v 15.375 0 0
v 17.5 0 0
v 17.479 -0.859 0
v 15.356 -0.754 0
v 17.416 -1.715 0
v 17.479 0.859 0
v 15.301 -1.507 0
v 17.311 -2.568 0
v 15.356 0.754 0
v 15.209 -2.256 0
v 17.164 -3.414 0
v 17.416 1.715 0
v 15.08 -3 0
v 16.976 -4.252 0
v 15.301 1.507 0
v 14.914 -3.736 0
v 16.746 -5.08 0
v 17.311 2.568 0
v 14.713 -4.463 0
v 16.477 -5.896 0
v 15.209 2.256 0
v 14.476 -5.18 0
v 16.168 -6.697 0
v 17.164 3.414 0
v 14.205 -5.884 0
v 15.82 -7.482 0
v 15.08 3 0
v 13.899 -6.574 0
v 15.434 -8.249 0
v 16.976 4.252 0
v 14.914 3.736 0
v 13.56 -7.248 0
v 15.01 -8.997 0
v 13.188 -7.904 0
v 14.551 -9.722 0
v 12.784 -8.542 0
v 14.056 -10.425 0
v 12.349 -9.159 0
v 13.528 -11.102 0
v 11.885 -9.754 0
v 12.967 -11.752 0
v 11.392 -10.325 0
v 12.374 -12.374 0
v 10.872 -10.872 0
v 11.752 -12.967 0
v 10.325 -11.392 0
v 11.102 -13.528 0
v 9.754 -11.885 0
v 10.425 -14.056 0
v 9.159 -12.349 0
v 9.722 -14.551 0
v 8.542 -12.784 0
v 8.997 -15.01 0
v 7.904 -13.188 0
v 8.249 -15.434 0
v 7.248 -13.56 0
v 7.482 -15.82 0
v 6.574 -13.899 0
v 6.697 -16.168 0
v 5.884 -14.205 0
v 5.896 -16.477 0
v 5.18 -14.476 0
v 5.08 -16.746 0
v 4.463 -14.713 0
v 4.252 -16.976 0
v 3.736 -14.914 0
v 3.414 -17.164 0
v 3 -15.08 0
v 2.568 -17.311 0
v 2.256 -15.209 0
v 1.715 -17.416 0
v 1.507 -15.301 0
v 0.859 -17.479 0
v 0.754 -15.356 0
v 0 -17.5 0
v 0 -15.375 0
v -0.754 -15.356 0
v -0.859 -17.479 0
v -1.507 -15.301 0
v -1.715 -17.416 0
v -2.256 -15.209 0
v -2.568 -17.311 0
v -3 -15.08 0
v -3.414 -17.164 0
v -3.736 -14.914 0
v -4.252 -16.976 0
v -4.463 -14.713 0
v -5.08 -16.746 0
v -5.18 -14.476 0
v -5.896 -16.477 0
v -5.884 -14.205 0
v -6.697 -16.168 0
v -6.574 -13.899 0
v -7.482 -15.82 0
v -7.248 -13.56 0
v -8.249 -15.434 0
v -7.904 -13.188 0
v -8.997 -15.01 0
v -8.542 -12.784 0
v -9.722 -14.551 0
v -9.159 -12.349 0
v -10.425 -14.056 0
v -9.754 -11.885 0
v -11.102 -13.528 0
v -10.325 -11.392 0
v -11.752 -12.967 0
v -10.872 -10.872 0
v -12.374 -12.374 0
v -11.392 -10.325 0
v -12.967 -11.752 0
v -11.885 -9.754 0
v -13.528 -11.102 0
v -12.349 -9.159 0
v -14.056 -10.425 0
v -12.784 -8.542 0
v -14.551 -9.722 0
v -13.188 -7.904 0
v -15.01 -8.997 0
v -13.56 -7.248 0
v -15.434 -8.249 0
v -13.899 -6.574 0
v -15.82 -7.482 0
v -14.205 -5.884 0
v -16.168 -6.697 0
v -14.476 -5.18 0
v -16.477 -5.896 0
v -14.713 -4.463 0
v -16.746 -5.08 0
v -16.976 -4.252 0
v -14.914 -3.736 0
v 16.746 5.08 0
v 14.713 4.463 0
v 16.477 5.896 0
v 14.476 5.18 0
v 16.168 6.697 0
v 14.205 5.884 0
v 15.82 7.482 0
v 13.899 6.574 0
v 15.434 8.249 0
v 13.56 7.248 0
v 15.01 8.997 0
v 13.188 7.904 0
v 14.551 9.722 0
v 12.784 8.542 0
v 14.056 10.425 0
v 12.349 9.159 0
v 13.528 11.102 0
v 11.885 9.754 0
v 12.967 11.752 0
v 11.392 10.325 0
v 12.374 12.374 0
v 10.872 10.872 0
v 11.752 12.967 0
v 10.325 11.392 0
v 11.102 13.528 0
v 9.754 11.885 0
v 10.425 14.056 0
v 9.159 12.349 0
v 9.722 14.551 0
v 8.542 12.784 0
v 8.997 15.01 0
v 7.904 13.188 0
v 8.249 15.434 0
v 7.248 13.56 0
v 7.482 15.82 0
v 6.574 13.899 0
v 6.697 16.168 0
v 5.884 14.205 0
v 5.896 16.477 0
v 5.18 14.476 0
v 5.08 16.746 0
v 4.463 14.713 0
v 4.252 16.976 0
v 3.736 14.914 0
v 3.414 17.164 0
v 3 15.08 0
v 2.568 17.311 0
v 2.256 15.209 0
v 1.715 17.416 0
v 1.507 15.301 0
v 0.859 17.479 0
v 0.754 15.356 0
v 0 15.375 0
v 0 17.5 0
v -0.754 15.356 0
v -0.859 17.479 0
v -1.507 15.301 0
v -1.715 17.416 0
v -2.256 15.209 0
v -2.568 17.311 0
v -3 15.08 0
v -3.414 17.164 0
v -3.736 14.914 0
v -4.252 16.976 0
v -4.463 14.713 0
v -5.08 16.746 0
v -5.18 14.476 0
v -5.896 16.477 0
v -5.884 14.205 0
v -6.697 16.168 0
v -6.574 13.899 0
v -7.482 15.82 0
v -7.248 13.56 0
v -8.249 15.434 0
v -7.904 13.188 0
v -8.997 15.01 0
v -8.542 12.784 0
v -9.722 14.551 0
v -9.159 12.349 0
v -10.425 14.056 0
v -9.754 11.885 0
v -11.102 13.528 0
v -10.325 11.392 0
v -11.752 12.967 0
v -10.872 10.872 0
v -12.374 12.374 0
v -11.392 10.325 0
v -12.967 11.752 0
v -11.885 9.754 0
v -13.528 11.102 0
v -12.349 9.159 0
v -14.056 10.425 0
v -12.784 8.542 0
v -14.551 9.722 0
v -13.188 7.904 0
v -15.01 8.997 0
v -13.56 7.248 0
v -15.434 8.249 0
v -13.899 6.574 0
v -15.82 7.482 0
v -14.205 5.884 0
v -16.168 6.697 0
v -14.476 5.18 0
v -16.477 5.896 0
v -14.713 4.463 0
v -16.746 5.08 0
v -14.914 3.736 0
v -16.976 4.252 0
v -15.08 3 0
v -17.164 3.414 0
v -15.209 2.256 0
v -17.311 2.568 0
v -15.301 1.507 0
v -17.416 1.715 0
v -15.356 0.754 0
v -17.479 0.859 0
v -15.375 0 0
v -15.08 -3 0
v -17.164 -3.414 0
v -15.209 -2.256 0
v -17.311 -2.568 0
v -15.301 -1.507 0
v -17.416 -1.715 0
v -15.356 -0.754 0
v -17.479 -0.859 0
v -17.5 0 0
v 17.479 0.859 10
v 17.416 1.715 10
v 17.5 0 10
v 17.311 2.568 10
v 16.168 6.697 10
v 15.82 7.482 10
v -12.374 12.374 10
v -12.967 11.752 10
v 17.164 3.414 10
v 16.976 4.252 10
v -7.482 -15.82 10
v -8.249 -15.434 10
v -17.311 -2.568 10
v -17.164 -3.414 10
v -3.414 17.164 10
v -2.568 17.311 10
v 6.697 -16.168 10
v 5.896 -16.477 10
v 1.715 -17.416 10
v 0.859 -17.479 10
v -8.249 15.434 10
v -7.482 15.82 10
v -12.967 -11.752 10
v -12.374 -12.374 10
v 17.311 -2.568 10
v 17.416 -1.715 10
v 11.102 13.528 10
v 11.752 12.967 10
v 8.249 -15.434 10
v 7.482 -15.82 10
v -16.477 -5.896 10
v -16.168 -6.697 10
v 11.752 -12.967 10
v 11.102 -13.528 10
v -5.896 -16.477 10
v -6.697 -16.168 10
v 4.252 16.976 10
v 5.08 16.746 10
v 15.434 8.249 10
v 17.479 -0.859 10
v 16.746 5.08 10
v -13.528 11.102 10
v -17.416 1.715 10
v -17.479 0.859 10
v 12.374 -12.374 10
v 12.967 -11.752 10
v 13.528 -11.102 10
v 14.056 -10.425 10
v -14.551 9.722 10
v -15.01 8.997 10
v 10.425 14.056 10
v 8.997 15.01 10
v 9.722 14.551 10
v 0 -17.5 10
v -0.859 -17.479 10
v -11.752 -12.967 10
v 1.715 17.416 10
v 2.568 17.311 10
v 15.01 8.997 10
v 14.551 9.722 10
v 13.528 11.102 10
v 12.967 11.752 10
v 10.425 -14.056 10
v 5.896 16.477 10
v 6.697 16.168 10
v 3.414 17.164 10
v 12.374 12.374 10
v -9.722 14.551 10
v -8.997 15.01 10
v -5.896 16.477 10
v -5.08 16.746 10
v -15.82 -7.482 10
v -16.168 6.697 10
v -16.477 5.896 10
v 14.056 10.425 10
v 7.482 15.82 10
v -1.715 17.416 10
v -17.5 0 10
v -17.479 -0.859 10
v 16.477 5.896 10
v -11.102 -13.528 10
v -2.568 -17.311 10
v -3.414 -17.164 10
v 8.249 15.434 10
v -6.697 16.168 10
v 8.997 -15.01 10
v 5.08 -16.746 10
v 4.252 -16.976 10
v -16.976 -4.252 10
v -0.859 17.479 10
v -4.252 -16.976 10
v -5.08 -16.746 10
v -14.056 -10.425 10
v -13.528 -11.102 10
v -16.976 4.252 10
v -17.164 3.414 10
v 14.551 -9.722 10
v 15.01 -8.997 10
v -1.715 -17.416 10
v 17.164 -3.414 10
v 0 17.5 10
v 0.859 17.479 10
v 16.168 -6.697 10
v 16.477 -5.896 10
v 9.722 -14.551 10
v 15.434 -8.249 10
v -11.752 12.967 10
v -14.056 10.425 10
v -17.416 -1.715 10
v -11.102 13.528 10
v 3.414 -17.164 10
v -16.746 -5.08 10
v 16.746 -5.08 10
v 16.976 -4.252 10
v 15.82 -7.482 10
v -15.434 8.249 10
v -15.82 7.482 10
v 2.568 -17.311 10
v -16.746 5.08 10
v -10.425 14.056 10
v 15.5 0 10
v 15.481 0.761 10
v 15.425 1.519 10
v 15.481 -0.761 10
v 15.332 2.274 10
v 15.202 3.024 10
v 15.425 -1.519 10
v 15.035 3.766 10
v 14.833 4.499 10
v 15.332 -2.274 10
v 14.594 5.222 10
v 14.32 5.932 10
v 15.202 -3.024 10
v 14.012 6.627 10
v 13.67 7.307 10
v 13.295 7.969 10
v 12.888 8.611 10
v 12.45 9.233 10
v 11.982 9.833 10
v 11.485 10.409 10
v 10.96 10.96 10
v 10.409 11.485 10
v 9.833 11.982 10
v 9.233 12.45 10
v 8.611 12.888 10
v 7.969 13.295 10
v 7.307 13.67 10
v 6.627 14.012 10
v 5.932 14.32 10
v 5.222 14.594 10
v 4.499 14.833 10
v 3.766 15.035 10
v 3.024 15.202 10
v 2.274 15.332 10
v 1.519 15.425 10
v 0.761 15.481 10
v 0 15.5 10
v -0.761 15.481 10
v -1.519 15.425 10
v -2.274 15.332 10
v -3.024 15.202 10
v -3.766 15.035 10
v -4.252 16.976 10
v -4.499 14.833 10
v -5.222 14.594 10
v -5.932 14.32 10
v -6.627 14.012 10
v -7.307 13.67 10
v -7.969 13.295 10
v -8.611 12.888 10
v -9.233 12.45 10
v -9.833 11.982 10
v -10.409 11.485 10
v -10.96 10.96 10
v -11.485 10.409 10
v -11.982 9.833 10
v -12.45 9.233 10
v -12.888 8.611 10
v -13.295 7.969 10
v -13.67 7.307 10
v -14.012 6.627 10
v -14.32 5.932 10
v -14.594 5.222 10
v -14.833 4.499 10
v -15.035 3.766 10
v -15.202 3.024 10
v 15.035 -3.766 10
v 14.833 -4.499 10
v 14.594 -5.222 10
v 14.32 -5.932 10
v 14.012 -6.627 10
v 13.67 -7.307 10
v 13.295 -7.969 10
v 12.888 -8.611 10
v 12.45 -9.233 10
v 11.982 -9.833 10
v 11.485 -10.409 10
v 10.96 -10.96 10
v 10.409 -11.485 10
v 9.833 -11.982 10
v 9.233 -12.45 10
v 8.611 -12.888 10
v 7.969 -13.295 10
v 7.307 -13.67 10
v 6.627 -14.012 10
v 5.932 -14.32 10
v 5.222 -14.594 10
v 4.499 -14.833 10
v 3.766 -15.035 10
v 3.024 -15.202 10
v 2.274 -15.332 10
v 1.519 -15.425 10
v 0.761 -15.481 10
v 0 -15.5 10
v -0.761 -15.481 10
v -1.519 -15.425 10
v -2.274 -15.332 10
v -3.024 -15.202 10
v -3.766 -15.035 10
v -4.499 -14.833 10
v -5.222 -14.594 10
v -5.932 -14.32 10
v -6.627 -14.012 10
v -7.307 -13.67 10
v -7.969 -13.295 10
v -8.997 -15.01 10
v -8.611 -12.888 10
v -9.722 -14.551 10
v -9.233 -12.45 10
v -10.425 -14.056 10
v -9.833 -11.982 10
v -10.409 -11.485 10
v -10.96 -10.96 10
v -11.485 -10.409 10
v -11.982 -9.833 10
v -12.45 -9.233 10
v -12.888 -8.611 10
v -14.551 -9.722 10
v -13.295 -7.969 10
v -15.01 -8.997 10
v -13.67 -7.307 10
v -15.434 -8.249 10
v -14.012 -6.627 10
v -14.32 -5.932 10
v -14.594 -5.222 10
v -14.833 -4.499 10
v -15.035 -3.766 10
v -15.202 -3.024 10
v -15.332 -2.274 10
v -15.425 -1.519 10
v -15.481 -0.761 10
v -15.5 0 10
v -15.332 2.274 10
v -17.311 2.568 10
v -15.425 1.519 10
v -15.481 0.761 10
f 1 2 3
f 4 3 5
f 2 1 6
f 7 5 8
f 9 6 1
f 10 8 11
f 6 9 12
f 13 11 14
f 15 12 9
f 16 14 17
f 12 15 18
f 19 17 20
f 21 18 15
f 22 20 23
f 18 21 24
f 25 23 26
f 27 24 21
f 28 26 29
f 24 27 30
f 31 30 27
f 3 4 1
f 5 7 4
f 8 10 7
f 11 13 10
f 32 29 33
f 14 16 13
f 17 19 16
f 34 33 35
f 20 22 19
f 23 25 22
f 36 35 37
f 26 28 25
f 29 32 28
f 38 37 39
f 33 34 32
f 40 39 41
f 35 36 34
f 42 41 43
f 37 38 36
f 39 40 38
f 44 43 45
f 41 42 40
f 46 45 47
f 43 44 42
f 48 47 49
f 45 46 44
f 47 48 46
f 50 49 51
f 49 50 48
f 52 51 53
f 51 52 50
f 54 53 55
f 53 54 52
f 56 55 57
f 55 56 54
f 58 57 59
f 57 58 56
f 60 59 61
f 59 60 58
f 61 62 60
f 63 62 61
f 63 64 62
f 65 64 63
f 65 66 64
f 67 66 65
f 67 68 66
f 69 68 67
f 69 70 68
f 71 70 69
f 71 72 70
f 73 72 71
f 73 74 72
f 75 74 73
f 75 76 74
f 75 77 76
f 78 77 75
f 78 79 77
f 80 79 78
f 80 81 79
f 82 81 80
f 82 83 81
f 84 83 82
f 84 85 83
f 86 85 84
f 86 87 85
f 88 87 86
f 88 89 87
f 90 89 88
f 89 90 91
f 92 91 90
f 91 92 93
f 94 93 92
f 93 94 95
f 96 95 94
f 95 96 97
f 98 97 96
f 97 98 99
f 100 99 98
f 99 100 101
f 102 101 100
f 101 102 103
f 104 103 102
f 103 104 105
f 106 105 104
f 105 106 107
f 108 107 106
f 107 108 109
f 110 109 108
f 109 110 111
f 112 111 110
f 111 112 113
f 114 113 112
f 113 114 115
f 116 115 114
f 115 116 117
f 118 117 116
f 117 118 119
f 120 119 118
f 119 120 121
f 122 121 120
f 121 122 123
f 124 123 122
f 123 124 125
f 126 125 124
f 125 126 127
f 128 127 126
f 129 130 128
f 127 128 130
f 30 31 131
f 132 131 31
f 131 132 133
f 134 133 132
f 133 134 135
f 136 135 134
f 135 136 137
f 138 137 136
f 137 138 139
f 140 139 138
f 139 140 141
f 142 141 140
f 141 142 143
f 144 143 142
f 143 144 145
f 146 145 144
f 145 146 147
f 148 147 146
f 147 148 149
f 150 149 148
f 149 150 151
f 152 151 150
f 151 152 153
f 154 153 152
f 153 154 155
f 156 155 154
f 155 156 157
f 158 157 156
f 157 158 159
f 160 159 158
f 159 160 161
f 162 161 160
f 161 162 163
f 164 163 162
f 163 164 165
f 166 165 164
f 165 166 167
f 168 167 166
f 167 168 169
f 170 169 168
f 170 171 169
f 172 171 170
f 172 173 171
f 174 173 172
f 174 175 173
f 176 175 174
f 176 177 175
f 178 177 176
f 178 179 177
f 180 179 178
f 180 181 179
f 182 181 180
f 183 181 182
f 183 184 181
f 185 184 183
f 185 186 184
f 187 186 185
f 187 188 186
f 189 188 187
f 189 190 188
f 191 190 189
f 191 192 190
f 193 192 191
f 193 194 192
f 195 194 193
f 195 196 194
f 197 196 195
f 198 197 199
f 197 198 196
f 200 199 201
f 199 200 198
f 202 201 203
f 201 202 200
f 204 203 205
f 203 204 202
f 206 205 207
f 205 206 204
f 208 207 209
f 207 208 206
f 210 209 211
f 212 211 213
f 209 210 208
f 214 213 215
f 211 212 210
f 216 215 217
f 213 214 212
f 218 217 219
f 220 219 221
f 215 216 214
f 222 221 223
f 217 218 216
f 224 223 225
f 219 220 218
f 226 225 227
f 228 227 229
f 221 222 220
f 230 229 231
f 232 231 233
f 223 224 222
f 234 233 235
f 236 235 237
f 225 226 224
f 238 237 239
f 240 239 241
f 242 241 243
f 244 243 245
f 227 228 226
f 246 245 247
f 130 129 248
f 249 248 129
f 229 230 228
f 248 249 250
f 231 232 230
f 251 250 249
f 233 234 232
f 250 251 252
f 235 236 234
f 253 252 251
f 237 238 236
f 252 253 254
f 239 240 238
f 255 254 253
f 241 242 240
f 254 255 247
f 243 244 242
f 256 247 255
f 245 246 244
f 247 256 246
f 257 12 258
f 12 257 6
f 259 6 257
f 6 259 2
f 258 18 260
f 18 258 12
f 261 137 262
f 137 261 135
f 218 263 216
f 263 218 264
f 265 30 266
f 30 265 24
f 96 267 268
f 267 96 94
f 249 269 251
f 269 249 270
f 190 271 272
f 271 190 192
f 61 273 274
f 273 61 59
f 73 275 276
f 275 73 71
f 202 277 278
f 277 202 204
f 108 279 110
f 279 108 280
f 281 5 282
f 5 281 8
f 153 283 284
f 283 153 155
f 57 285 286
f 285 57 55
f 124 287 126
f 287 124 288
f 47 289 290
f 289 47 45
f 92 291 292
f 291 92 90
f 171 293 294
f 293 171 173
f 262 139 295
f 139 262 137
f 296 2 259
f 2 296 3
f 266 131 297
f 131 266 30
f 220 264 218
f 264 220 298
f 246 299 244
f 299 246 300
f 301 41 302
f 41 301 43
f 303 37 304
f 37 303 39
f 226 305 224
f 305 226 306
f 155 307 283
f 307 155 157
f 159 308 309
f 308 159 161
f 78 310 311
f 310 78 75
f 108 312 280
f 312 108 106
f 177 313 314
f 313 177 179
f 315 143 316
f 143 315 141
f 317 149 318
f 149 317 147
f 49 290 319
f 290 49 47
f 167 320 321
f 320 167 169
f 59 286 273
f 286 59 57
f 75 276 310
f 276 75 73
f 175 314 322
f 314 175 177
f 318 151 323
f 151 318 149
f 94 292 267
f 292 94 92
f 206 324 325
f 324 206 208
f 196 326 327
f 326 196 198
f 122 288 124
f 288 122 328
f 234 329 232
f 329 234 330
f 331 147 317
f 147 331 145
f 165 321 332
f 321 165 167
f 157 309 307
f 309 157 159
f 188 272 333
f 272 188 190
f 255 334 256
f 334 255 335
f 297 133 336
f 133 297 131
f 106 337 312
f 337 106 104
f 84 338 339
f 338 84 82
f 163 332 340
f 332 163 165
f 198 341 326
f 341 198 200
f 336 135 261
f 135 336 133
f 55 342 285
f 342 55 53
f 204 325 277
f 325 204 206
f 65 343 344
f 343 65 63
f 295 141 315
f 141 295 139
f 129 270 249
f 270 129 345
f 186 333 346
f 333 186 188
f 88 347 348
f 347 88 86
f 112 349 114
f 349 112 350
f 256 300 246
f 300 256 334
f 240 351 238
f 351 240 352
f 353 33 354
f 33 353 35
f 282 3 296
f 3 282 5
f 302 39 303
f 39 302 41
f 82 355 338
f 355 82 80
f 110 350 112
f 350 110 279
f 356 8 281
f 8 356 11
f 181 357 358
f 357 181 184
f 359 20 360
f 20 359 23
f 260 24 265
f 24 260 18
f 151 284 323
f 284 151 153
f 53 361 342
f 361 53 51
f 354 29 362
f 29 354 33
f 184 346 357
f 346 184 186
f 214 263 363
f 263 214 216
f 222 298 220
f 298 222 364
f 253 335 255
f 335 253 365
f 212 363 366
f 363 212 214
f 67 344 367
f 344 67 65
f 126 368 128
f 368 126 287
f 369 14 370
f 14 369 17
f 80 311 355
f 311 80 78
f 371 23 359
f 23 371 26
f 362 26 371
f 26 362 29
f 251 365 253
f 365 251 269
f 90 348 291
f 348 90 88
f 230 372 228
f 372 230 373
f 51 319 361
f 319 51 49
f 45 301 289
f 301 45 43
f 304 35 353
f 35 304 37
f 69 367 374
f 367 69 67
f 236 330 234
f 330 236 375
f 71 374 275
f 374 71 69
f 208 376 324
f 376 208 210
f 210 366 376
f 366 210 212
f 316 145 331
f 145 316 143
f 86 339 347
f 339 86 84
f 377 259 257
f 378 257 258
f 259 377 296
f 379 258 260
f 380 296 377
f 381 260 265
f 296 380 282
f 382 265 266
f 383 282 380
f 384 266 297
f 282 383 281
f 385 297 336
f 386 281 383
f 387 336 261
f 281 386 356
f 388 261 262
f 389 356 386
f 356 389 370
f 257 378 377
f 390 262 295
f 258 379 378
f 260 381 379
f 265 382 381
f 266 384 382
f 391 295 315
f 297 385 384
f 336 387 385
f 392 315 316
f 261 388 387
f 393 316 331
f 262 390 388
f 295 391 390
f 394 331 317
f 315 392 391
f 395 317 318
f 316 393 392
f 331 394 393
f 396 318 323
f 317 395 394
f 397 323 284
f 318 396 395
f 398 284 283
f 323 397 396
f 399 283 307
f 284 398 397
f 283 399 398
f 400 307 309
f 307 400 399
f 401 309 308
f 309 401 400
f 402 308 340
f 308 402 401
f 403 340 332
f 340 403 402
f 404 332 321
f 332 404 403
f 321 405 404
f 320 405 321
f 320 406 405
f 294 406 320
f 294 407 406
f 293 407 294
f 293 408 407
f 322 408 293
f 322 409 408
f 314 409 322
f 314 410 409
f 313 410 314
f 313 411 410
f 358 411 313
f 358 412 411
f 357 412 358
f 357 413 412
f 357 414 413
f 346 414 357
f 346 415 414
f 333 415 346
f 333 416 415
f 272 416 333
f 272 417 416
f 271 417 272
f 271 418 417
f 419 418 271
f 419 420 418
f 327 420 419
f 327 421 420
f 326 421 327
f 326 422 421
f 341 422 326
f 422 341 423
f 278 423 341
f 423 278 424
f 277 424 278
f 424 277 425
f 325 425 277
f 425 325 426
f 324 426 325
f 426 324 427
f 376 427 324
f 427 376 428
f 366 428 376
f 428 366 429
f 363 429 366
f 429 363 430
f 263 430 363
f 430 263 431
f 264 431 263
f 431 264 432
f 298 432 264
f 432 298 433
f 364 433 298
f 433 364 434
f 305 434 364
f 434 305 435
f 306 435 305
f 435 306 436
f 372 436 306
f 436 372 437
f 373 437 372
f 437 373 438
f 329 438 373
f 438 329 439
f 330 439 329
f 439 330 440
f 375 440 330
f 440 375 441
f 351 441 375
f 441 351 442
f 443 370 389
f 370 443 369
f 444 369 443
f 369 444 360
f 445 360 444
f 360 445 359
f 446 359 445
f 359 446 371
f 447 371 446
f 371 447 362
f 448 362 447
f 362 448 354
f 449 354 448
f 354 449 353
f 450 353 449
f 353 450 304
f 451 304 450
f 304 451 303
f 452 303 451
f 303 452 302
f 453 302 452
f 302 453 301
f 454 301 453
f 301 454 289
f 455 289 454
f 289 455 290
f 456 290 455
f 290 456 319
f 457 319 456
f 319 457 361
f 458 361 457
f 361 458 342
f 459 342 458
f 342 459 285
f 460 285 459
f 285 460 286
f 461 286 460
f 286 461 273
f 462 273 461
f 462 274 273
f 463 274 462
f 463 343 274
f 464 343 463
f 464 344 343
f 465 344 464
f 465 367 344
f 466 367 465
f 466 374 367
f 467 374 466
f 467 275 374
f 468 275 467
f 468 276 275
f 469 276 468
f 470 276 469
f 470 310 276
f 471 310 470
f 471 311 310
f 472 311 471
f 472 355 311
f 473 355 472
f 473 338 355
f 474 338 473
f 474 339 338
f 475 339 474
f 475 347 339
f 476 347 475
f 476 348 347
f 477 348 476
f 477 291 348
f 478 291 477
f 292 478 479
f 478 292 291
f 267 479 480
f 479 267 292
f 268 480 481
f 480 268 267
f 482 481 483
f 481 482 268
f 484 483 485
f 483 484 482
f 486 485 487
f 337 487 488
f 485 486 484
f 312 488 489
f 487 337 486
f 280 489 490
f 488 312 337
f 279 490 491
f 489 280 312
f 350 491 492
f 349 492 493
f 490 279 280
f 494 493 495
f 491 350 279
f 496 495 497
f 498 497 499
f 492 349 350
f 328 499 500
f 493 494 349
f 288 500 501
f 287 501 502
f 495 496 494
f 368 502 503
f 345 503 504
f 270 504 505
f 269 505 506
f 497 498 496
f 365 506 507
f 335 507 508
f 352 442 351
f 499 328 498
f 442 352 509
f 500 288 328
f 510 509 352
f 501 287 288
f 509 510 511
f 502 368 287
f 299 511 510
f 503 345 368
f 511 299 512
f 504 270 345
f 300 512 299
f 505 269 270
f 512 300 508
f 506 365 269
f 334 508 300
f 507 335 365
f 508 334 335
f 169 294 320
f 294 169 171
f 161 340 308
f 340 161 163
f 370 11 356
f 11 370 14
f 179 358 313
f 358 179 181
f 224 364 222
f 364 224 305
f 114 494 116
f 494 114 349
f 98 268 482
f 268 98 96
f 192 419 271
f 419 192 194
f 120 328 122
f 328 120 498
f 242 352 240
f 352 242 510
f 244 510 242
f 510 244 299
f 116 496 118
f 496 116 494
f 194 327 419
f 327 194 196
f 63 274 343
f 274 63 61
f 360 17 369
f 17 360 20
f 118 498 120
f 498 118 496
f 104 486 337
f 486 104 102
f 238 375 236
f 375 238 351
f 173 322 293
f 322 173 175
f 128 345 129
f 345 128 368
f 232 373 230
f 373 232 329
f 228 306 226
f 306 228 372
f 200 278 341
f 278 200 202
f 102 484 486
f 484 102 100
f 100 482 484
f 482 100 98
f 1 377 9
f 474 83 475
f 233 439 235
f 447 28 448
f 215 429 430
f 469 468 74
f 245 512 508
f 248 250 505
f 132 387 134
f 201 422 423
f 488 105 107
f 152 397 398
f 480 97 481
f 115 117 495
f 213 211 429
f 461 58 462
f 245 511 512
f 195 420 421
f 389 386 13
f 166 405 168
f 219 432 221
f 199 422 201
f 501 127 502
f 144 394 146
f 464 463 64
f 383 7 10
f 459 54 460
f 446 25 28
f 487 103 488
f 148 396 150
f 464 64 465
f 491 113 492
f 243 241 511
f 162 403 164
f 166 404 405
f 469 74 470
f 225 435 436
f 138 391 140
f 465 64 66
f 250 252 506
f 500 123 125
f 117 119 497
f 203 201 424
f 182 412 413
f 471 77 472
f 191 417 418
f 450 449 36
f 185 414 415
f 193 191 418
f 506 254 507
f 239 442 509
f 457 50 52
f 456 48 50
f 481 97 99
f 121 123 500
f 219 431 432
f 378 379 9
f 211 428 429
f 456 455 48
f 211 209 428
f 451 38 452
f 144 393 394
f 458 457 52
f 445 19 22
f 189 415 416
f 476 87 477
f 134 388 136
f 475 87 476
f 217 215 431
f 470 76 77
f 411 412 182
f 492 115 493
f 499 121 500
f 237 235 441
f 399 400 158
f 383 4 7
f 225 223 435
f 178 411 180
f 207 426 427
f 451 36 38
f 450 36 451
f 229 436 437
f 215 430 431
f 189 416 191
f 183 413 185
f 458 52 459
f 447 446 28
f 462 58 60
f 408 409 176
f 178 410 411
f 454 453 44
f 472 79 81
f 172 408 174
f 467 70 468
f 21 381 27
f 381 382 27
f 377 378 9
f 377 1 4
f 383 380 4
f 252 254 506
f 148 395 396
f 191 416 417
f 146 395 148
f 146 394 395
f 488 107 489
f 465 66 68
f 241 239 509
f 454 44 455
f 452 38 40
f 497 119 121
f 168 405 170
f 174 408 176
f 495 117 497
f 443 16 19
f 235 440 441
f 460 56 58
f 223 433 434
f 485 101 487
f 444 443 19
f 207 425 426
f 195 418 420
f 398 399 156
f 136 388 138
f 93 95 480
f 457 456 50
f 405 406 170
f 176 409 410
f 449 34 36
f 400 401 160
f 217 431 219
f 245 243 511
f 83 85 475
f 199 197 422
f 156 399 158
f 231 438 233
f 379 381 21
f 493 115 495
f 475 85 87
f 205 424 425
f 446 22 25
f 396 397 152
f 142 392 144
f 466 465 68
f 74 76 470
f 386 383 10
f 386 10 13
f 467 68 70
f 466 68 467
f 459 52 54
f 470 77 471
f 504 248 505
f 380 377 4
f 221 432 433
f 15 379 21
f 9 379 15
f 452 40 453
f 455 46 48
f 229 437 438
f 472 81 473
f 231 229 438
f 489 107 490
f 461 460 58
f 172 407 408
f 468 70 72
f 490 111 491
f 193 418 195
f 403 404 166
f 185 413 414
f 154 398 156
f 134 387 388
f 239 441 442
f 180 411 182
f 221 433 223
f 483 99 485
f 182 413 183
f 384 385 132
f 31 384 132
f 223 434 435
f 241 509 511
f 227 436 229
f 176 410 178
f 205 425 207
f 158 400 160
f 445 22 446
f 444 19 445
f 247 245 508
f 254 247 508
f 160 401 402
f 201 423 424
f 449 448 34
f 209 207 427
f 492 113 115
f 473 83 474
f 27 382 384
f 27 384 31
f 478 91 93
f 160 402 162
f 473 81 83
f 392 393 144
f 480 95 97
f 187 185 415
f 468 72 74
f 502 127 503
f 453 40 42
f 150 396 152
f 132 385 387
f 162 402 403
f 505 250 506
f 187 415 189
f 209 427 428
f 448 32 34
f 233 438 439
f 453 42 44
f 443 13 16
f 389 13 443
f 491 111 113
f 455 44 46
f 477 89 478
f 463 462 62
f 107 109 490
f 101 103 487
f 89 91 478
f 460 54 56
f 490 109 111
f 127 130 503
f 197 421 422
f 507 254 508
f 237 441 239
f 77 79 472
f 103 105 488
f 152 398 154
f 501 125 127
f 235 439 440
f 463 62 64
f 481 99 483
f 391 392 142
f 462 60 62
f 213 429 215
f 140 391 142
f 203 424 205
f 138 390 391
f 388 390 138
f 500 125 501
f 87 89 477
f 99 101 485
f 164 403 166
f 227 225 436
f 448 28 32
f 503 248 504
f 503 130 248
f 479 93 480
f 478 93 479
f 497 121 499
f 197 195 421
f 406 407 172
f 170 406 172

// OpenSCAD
// Drilling vacuum attachment adapter
// 10mm tall collar, OD 35mm, ID tapered from 30.75mm to 31mm.

$fn = 128;

outer_diameter = 35;
inner_diameter_bottom = 30.75;
inner_diameter_top = 31;
height = 10;
dot_count = 6;
dot_diameter = 2;
dot_height = 1;
dot_radius = (outer_diameter / 2) - 1.5;

difference() {
  union() {
    cylinder(h = height, d = outer_diameter);
    for (i = [0 : dot_count - 1]) {
      rotate([0, 0, i * 360 / dot_count])
        translate([dot_radius, 0, 0])
          cylinder(h = dot_height, d = dot_diameter);
    }
  }
  cylinder(h = height, d1 = inner_diameter_bottom, d2 = inner_diameter_top);
}
